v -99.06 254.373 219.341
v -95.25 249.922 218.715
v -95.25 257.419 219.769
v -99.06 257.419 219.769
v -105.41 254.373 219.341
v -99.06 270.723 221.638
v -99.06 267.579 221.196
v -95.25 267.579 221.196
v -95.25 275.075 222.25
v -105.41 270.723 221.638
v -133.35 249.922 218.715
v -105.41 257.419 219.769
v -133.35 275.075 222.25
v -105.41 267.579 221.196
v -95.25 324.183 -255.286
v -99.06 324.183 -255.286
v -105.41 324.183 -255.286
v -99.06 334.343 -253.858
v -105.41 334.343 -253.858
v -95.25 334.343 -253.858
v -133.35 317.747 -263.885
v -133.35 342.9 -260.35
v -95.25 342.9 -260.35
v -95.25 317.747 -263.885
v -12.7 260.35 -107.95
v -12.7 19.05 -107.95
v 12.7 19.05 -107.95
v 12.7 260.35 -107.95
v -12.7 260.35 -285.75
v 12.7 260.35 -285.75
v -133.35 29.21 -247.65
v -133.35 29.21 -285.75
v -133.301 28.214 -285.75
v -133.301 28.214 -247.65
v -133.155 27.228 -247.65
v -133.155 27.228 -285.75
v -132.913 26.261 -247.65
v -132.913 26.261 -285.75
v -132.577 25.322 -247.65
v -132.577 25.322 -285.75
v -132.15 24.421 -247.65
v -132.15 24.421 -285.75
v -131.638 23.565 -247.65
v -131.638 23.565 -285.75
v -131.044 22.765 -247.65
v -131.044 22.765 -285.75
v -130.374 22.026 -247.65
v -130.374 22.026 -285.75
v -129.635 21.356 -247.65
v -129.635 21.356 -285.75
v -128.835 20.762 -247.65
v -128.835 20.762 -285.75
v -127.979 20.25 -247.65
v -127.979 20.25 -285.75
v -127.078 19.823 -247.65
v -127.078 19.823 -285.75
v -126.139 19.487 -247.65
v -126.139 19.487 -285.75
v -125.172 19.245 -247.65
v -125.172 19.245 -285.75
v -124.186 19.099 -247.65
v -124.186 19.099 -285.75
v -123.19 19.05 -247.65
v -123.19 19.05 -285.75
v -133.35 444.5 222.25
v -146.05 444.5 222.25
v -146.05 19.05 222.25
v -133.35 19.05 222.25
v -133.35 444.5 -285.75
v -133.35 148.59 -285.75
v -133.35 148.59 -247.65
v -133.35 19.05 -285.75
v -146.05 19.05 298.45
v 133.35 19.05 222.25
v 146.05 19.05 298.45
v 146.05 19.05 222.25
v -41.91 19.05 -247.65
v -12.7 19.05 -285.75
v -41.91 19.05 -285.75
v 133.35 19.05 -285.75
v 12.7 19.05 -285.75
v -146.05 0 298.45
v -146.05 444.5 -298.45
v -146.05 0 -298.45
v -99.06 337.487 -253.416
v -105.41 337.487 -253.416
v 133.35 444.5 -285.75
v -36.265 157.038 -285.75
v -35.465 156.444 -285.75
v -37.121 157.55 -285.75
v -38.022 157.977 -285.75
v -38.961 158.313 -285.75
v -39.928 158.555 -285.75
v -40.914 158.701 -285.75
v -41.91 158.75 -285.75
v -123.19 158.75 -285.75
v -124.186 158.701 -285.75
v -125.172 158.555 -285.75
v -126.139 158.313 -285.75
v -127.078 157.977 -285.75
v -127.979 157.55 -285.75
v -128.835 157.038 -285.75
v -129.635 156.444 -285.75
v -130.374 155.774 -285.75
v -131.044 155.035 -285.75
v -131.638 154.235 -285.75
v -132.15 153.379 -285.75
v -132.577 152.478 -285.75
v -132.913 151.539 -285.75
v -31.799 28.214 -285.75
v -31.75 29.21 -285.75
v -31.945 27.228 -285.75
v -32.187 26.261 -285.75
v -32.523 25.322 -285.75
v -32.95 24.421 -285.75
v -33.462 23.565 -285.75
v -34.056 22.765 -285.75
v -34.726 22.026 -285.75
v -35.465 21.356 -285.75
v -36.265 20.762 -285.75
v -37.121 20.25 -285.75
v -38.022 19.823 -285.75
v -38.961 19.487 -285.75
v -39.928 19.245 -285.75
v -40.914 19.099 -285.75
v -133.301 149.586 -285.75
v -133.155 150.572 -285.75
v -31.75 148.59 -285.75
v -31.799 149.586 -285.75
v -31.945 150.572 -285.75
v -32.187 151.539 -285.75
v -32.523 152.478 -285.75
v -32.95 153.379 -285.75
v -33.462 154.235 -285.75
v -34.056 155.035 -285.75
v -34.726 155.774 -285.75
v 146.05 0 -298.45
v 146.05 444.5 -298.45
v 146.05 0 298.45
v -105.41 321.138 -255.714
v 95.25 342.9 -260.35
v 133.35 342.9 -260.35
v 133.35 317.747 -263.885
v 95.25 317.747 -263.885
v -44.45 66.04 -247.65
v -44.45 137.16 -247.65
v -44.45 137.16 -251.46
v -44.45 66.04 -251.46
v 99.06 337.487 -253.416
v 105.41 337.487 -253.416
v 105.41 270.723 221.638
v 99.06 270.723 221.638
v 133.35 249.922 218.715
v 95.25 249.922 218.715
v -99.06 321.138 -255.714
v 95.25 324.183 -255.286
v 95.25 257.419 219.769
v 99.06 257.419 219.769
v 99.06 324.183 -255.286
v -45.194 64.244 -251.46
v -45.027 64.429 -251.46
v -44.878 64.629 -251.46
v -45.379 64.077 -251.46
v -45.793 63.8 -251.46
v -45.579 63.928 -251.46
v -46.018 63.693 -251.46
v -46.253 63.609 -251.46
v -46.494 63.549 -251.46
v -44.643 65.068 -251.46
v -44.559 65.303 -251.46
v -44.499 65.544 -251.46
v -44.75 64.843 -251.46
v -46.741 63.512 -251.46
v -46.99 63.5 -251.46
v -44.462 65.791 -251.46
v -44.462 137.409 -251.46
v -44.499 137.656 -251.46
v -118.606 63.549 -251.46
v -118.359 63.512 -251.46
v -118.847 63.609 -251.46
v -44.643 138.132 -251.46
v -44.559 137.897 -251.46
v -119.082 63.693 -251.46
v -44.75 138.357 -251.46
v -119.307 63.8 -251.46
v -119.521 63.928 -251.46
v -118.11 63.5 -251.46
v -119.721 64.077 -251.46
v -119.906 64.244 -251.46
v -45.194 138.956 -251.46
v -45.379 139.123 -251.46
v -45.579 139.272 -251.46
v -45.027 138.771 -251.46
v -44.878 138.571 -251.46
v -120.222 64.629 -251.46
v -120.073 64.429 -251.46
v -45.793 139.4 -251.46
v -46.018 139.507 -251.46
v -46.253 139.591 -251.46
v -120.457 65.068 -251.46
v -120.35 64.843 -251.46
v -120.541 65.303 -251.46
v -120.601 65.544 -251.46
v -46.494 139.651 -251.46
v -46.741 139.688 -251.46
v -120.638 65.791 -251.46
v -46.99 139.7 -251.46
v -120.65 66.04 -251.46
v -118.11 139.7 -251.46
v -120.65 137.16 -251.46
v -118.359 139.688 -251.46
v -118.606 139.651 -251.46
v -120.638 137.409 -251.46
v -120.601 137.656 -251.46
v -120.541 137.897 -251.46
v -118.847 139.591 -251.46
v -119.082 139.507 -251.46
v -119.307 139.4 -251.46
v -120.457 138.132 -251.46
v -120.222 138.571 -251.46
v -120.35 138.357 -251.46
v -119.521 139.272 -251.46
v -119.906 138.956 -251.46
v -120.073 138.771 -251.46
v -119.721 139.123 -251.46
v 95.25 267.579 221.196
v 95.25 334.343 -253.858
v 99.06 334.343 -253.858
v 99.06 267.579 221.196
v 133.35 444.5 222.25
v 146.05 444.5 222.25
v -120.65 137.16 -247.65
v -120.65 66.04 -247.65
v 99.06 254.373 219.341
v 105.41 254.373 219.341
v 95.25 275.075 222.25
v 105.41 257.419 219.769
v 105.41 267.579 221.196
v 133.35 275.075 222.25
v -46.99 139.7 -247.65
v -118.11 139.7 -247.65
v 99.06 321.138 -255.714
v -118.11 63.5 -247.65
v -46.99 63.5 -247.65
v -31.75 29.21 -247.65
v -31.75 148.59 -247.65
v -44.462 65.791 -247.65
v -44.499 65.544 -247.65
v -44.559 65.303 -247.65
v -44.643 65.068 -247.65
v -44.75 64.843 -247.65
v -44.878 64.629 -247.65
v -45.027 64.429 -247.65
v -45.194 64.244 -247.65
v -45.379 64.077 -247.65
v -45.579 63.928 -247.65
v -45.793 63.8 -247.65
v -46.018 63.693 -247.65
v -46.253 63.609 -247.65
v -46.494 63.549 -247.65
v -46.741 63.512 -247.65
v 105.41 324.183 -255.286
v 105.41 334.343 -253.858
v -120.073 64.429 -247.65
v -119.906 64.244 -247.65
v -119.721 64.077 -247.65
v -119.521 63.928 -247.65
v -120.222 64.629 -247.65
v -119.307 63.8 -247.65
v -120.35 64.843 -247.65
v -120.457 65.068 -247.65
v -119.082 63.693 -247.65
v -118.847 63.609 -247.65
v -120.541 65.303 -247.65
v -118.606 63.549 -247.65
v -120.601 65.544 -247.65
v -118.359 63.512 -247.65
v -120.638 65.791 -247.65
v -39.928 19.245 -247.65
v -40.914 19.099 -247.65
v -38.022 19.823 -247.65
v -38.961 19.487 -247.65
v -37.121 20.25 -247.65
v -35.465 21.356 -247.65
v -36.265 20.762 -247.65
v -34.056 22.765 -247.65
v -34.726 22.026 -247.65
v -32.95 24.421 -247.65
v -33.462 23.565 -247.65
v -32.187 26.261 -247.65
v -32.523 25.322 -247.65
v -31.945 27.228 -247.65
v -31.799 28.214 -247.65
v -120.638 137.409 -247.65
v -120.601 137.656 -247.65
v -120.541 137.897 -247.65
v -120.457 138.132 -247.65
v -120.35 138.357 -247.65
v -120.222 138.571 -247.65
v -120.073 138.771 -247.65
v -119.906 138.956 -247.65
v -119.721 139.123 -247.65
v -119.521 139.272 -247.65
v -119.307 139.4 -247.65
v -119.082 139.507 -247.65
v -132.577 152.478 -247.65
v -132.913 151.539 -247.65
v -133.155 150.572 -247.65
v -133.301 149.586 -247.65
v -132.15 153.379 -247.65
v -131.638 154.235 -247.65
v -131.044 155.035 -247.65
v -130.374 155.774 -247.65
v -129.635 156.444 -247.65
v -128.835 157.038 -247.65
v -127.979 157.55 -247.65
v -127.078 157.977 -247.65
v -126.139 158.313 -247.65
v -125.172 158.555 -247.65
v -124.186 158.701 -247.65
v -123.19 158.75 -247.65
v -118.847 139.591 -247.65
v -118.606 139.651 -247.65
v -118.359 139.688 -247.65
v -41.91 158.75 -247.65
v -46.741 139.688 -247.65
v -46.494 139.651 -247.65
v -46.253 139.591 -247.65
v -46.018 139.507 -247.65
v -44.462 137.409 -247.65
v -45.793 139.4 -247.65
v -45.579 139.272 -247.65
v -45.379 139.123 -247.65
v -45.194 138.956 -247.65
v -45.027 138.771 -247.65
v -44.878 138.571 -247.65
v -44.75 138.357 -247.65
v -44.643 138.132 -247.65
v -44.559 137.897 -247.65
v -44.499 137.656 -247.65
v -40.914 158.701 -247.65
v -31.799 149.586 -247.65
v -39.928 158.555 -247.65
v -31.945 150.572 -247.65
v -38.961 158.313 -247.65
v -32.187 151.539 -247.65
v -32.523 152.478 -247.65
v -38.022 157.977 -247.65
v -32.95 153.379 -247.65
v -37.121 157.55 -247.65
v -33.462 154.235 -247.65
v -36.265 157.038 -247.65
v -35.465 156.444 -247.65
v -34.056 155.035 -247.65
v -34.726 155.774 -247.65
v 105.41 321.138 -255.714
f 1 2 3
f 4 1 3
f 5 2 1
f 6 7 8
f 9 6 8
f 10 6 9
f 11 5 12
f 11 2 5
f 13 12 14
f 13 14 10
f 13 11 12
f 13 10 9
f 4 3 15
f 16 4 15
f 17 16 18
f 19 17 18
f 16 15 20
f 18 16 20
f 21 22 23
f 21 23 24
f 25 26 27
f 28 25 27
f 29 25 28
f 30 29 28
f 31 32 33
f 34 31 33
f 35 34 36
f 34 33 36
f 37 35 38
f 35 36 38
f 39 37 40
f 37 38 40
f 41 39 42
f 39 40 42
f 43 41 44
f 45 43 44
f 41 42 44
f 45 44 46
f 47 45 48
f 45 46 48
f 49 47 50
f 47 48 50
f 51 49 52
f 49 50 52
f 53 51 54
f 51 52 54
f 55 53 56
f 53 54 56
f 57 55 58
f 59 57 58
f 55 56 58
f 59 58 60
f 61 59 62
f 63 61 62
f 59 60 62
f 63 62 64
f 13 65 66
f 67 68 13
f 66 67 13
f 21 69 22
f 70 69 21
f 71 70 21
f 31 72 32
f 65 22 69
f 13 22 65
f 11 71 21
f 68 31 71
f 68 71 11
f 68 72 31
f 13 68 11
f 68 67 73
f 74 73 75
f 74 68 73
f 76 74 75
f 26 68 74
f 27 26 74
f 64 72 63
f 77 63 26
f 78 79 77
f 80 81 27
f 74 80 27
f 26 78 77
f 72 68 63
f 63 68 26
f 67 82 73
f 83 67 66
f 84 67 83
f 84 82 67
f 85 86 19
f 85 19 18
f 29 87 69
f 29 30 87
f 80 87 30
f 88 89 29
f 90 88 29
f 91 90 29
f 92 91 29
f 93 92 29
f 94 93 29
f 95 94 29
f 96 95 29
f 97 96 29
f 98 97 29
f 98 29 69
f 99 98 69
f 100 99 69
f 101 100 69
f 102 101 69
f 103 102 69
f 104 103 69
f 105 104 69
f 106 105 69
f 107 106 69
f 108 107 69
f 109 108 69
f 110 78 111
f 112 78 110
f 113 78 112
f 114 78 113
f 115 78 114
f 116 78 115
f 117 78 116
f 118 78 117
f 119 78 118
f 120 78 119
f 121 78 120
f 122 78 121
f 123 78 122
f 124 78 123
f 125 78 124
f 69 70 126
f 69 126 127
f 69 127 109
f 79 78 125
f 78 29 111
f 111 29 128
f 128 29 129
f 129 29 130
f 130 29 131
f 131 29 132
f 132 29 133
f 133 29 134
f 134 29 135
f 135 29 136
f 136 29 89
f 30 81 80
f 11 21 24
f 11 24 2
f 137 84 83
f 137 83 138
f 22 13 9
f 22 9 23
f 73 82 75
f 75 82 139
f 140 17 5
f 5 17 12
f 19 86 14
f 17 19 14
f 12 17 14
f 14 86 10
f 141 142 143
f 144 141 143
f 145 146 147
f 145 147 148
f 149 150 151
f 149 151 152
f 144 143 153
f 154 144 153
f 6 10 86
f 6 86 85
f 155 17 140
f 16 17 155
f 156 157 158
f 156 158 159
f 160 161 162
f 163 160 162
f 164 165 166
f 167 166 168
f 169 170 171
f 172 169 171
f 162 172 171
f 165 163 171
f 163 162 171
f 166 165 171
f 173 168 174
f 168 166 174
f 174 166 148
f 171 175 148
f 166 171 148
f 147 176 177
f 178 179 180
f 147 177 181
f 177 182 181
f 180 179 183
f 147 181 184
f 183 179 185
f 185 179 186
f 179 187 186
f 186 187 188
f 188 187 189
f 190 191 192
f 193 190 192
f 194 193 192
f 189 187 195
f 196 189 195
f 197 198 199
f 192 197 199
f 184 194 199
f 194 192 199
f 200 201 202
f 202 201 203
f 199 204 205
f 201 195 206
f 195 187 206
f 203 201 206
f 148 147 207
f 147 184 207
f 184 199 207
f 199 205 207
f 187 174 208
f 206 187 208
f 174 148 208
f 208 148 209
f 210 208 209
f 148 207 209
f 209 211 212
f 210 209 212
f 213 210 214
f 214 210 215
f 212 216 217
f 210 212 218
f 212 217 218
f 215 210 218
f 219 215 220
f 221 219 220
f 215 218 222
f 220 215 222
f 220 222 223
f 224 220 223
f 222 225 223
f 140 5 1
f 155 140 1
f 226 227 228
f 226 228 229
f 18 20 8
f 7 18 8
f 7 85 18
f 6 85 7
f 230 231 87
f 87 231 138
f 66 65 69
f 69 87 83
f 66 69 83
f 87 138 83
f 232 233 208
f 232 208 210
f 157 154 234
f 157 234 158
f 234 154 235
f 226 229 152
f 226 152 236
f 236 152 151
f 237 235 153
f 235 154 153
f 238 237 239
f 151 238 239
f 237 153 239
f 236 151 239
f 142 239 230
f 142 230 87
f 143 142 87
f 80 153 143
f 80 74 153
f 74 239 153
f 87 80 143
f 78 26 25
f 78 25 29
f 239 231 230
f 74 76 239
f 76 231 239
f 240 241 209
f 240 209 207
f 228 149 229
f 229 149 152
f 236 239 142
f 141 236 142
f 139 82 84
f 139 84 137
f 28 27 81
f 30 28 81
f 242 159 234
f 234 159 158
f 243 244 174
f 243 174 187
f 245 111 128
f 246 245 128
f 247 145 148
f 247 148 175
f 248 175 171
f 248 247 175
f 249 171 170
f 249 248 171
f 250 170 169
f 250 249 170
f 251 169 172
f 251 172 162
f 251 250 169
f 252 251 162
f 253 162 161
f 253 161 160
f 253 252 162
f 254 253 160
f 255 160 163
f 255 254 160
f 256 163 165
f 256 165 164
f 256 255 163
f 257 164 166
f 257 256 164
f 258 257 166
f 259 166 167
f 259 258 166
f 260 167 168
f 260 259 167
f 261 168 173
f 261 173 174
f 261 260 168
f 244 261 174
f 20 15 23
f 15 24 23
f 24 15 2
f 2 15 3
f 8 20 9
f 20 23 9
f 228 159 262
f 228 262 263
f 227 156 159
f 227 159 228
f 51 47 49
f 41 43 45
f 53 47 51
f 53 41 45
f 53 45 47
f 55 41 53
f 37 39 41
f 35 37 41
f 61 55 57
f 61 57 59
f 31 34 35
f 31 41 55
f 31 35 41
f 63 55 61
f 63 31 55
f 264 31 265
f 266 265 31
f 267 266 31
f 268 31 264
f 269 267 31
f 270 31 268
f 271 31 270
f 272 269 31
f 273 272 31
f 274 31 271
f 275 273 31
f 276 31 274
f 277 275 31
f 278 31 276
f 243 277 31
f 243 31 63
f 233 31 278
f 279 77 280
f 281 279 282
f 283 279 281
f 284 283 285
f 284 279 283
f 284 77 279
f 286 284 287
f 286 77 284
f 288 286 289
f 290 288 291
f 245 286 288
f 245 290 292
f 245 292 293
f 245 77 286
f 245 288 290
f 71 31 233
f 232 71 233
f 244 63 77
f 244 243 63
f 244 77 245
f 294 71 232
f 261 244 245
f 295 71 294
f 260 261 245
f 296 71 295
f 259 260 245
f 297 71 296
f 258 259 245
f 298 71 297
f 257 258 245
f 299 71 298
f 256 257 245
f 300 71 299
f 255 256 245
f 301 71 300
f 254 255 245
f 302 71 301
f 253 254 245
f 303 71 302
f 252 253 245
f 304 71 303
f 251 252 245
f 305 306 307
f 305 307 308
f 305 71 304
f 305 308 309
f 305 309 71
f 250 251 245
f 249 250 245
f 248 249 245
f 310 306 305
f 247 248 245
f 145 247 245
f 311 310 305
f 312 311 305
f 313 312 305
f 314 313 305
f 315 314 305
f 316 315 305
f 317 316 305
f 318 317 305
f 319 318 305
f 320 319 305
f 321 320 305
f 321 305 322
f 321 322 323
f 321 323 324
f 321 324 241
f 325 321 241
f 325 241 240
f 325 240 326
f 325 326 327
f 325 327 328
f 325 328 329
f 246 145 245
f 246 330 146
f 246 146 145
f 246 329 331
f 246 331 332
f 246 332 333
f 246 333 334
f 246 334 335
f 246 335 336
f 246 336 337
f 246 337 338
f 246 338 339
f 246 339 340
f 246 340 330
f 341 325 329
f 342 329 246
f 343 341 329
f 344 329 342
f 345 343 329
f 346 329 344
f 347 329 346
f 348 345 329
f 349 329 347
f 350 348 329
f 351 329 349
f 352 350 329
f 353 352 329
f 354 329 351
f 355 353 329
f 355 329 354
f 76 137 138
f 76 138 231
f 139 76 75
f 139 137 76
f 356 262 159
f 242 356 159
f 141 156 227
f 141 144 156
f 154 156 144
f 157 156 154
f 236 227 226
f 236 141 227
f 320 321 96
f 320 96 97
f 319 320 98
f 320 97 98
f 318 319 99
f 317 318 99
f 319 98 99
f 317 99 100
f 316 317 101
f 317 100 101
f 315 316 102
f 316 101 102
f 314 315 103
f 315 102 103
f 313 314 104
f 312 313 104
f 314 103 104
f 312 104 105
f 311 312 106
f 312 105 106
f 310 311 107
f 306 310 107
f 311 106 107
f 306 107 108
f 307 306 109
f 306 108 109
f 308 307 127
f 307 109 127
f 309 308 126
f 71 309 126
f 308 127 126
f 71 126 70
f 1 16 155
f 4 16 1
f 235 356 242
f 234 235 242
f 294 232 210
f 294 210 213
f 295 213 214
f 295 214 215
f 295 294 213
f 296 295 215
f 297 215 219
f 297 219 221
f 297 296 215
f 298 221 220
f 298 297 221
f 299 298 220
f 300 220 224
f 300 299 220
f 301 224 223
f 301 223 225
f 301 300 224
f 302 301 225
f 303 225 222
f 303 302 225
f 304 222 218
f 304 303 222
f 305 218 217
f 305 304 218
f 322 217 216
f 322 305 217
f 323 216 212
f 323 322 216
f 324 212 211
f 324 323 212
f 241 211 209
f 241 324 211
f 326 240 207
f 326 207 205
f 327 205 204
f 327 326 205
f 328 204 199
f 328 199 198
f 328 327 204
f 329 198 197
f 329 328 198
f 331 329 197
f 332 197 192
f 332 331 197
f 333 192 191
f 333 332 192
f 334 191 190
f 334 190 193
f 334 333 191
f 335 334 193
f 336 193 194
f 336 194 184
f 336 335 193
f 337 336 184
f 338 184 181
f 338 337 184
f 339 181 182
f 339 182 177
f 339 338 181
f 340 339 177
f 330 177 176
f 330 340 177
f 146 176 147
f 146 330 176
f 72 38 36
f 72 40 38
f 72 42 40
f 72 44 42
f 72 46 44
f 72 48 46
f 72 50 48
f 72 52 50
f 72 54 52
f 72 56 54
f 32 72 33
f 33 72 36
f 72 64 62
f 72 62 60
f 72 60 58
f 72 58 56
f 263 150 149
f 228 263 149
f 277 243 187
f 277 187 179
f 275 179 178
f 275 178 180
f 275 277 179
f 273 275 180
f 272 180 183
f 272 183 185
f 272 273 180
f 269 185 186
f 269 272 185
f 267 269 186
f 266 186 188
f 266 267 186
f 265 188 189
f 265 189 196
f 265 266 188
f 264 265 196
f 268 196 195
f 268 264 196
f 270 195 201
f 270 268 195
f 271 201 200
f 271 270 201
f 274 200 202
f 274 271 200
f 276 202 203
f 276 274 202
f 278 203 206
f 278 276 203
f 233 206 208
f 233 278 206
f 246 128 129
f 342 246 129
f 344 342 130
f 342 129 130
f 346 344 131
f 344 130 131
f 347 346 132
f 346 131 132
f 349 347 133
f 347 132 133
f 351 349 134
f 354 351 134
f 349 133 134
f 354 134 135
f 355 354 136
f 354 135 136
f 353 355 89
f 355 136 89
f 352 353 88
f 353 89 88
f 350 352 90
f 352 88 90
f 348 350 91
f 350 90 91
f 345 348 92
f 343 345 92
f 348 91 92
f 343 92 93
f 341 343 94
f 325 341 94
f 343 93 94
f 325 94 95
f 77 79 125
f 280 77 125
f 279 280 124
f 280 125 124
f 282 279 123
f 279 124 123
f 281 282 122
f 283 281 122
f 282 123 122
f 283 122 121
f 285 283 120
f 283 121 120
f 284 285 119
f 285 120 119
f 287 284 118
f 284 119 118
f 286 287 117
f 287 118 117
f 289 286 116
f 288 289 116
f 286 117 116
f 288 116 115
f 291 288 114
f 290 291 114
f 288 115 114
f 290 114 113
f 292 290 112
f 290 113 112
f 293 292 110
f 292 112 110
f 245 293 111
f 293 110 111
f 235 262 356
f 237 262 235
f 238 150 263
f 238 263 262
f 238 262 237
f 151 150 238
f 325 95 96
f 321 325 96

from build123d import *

# Parameters (mm, degrees)
SKETCH1_W           = 292.1
SKETCH1_H           = 596.9
BOSS_EXTRUDE1_DEPTH = 19.05
BOSS_EXTRUDE2_DEPTH = 425.45
BOSS_EXTRUDE3_DEPTH = 38.1
CUT_EXTRUDE1_DEPTH  = 10.16
CUT_EXTRUDE2_START  = -3.175
SKETCH5_W           = 6.35
SKETCH5_H           = 479.722786497
CUT_EXTRUDE2_DEPTH  = 16.51
SKETCH6_W           = 25.4
SKETCH6_H           = 177.8
BOSS_EXTRUDE4_DEPTH = 241.3
BOSS_EXTRUDE6_DEPTH = 38.1
CUT_EXTRUDE3_DEPTH  = 3.81


with BuildPart() as part:
    # Sketch1 → Boss-Extrude1 (new body)
    with BuildSketch(Plane(origin=(0, 0, 0), x_dir=(1, 0, 0), z_dir=(0, 1, 0))):
        Rectangle(SKETCH1_W, SKETCH1_H)
    extrude(amount=BOSS_EXTRUDE1_DEPTH)

    # Sketch2 → Boss-Extrude2 (add)
    with BuildSketch(Plane(origin=(0, 19.05, 0), x_dir=(1, 0, 0), z_dir=(0, 1, 0))):
        Polygon((-146.05, -222.25), (-146.05, 298.45), (146.05, 298.45), (146.05, -222.25), (133.35, -222.25), (133.35, 285.75), (-133.35, 285.75), (-133.35, -222.25), align=None)
    extrude(amount=BOSS_EXTRUDE2_DEPTH)

    # Sketch3 → Boss-Extrude3 (add)
    with BuildSketch(Plane(origin=(-133.35, 0, 0), x_dir=(0, 0, -1), z_dir=(1, 0, 0))):
        Polygon((-222.25, 275.074993173), (260.35, 342.9), (263.884996764, 317.747191054), (-218.715003236, 249.922184227), align=None)
    boss_extrude3 = extrude(amount=BOSS_EXTRUDE3_DEPTH)

    # Sketch4 → Cut-Extrude1 (cut)
    with BuildSketch(Plane(origin=(-95.25, 0, 0), x_dir=(0, 0, -1), z_dir=(1, 0, 0))):
        Polygon((-221.196449058, 267.5785887), (-219.768554178, 257.4185887), (255.285603139, 324.183096498), (253.857708258, 334.343096498), align=None)
    cut_extrude1 = extrude(amount=-CUT_EXTRUDE1_DEPTH, mode=Mode.SUBTRACT)

    # Sketch5 → Cut-Extrude2 (cut)
    with BuildSketch(Plane(origin=(0, 292.880820502, 41.161714982), x_dir=(1, 0, 0), z_dir=(0, -0.9902680687415715, -0.13917310096005858)).offset(CUT_EXTRUDE2_START)):
        with Locations((-102.235, -58.057354767)):
            Rectangle(SKETCH5_W, SKETCH5_H)
    cut_extrude2 = extrude(amount=CUT_EXTRUDE2_DEPTH, mode=Mode.SUBTRACT)

    # Mirror1: Boss-Extrude3, Cut-Extrude1, Cut-Extrude2 across plane
    add(boss_extrude3.mirror(Plane(origin=(0, 0, 0), x_dir=(0, 0, 1), z_dir=(1, 0, 0))))
    add(cut_extrude1.mirror(Plane(origin=(0, 0, 0), x_dir=(0, 0, 1), z_dir=(1, 0, 0))), mode=Mode.SUBTRACT)
    add(cut_extrude2.mirror(Plane(origin=(0, 0, 0), x_dir=(0, 0, 1), z_dir=(1, 0, 0))), mode=Mode.SUBTRACT)

    # Sketch6 → Boss-Extrude4 (add)
    with BuildSketch(Plane(origin=(0, 19.05, 0), x_dir=(1, 0, 0), z_dir=(0, 1, 0))):
        with Locations((0, 196.85)):
            Rectangle(SKETCH6_W, SKETCH6_H)
    extrude(amount=BOSS_EXTRUDE4_DEPTH)

    # Sketch8 → Boss-Extrude6 (add)
    with BuildSketch(Plane.XY.offset(-285.75)):
        with BuildLine():
            Line((-123.19, 19.05), (-41.91, 19.05))
            ThreePointArc((-41.91, 19.05), (-34.725795103, 22.025795103), (-31.75, 29.21))
            Line((-31.75, 29.21), (-31.75, 148.59))
            ThreePointArc((-31.75, 148.59), (-34.725795103, 155.774204897), (-41.91, 158.75))
            Line((-41.91, 158.75), (-123.19, 158.75))
            ThreePointArc((-123.19, 158.75), (-130.374204897, 155.774204897), (-133.35, 148.59))
            Line((-133.35, 148.59), (-133.35, 29.21))
            ThreePointArc((-133.35, 29.21), (-130.374204897, 22.025795103), (-123.19, 19.05))
        make_face()
    extrude(amount=BOSS_EXTRUDE6_DEPTH)

    # Sketch9 → Cut-Extrude3 (cut)
    with BuildSketch(Plane.XY.offset(-247.65)):
        with BuildLine():
            Line((-118.11, 139.7), (-46.99, 139.7))
            ThreePointArc((-46.99, 139.7), (-45.193948776, 138.956051224), (-44.45, 137.16))
            Line((-44.45, 137.16), (-44.45, 66.04))
            ThreePointArc((-44.45, 66.04), (-45.193948776, 64.243948776), (-46.99, 63.5))
            Line((-46.99, 63.5), (-118.11, 63.5))
            ThreePointArc((-118.11, 63.5), (-119.906051224, 64.243948776), (-120.65, 66.04))
            Line((-120.65, 66.04), (-120.65, 137.16))
            ThreePointArc((-120.65, 137.16), (-119.906051224, 138.956051224), (-118.11, 139.7))
        make_face()
    extrude(amount=-CUT_EXTRUDE3_DEPTH, mode=Mode.SUBTRACT)


solid = part.part
